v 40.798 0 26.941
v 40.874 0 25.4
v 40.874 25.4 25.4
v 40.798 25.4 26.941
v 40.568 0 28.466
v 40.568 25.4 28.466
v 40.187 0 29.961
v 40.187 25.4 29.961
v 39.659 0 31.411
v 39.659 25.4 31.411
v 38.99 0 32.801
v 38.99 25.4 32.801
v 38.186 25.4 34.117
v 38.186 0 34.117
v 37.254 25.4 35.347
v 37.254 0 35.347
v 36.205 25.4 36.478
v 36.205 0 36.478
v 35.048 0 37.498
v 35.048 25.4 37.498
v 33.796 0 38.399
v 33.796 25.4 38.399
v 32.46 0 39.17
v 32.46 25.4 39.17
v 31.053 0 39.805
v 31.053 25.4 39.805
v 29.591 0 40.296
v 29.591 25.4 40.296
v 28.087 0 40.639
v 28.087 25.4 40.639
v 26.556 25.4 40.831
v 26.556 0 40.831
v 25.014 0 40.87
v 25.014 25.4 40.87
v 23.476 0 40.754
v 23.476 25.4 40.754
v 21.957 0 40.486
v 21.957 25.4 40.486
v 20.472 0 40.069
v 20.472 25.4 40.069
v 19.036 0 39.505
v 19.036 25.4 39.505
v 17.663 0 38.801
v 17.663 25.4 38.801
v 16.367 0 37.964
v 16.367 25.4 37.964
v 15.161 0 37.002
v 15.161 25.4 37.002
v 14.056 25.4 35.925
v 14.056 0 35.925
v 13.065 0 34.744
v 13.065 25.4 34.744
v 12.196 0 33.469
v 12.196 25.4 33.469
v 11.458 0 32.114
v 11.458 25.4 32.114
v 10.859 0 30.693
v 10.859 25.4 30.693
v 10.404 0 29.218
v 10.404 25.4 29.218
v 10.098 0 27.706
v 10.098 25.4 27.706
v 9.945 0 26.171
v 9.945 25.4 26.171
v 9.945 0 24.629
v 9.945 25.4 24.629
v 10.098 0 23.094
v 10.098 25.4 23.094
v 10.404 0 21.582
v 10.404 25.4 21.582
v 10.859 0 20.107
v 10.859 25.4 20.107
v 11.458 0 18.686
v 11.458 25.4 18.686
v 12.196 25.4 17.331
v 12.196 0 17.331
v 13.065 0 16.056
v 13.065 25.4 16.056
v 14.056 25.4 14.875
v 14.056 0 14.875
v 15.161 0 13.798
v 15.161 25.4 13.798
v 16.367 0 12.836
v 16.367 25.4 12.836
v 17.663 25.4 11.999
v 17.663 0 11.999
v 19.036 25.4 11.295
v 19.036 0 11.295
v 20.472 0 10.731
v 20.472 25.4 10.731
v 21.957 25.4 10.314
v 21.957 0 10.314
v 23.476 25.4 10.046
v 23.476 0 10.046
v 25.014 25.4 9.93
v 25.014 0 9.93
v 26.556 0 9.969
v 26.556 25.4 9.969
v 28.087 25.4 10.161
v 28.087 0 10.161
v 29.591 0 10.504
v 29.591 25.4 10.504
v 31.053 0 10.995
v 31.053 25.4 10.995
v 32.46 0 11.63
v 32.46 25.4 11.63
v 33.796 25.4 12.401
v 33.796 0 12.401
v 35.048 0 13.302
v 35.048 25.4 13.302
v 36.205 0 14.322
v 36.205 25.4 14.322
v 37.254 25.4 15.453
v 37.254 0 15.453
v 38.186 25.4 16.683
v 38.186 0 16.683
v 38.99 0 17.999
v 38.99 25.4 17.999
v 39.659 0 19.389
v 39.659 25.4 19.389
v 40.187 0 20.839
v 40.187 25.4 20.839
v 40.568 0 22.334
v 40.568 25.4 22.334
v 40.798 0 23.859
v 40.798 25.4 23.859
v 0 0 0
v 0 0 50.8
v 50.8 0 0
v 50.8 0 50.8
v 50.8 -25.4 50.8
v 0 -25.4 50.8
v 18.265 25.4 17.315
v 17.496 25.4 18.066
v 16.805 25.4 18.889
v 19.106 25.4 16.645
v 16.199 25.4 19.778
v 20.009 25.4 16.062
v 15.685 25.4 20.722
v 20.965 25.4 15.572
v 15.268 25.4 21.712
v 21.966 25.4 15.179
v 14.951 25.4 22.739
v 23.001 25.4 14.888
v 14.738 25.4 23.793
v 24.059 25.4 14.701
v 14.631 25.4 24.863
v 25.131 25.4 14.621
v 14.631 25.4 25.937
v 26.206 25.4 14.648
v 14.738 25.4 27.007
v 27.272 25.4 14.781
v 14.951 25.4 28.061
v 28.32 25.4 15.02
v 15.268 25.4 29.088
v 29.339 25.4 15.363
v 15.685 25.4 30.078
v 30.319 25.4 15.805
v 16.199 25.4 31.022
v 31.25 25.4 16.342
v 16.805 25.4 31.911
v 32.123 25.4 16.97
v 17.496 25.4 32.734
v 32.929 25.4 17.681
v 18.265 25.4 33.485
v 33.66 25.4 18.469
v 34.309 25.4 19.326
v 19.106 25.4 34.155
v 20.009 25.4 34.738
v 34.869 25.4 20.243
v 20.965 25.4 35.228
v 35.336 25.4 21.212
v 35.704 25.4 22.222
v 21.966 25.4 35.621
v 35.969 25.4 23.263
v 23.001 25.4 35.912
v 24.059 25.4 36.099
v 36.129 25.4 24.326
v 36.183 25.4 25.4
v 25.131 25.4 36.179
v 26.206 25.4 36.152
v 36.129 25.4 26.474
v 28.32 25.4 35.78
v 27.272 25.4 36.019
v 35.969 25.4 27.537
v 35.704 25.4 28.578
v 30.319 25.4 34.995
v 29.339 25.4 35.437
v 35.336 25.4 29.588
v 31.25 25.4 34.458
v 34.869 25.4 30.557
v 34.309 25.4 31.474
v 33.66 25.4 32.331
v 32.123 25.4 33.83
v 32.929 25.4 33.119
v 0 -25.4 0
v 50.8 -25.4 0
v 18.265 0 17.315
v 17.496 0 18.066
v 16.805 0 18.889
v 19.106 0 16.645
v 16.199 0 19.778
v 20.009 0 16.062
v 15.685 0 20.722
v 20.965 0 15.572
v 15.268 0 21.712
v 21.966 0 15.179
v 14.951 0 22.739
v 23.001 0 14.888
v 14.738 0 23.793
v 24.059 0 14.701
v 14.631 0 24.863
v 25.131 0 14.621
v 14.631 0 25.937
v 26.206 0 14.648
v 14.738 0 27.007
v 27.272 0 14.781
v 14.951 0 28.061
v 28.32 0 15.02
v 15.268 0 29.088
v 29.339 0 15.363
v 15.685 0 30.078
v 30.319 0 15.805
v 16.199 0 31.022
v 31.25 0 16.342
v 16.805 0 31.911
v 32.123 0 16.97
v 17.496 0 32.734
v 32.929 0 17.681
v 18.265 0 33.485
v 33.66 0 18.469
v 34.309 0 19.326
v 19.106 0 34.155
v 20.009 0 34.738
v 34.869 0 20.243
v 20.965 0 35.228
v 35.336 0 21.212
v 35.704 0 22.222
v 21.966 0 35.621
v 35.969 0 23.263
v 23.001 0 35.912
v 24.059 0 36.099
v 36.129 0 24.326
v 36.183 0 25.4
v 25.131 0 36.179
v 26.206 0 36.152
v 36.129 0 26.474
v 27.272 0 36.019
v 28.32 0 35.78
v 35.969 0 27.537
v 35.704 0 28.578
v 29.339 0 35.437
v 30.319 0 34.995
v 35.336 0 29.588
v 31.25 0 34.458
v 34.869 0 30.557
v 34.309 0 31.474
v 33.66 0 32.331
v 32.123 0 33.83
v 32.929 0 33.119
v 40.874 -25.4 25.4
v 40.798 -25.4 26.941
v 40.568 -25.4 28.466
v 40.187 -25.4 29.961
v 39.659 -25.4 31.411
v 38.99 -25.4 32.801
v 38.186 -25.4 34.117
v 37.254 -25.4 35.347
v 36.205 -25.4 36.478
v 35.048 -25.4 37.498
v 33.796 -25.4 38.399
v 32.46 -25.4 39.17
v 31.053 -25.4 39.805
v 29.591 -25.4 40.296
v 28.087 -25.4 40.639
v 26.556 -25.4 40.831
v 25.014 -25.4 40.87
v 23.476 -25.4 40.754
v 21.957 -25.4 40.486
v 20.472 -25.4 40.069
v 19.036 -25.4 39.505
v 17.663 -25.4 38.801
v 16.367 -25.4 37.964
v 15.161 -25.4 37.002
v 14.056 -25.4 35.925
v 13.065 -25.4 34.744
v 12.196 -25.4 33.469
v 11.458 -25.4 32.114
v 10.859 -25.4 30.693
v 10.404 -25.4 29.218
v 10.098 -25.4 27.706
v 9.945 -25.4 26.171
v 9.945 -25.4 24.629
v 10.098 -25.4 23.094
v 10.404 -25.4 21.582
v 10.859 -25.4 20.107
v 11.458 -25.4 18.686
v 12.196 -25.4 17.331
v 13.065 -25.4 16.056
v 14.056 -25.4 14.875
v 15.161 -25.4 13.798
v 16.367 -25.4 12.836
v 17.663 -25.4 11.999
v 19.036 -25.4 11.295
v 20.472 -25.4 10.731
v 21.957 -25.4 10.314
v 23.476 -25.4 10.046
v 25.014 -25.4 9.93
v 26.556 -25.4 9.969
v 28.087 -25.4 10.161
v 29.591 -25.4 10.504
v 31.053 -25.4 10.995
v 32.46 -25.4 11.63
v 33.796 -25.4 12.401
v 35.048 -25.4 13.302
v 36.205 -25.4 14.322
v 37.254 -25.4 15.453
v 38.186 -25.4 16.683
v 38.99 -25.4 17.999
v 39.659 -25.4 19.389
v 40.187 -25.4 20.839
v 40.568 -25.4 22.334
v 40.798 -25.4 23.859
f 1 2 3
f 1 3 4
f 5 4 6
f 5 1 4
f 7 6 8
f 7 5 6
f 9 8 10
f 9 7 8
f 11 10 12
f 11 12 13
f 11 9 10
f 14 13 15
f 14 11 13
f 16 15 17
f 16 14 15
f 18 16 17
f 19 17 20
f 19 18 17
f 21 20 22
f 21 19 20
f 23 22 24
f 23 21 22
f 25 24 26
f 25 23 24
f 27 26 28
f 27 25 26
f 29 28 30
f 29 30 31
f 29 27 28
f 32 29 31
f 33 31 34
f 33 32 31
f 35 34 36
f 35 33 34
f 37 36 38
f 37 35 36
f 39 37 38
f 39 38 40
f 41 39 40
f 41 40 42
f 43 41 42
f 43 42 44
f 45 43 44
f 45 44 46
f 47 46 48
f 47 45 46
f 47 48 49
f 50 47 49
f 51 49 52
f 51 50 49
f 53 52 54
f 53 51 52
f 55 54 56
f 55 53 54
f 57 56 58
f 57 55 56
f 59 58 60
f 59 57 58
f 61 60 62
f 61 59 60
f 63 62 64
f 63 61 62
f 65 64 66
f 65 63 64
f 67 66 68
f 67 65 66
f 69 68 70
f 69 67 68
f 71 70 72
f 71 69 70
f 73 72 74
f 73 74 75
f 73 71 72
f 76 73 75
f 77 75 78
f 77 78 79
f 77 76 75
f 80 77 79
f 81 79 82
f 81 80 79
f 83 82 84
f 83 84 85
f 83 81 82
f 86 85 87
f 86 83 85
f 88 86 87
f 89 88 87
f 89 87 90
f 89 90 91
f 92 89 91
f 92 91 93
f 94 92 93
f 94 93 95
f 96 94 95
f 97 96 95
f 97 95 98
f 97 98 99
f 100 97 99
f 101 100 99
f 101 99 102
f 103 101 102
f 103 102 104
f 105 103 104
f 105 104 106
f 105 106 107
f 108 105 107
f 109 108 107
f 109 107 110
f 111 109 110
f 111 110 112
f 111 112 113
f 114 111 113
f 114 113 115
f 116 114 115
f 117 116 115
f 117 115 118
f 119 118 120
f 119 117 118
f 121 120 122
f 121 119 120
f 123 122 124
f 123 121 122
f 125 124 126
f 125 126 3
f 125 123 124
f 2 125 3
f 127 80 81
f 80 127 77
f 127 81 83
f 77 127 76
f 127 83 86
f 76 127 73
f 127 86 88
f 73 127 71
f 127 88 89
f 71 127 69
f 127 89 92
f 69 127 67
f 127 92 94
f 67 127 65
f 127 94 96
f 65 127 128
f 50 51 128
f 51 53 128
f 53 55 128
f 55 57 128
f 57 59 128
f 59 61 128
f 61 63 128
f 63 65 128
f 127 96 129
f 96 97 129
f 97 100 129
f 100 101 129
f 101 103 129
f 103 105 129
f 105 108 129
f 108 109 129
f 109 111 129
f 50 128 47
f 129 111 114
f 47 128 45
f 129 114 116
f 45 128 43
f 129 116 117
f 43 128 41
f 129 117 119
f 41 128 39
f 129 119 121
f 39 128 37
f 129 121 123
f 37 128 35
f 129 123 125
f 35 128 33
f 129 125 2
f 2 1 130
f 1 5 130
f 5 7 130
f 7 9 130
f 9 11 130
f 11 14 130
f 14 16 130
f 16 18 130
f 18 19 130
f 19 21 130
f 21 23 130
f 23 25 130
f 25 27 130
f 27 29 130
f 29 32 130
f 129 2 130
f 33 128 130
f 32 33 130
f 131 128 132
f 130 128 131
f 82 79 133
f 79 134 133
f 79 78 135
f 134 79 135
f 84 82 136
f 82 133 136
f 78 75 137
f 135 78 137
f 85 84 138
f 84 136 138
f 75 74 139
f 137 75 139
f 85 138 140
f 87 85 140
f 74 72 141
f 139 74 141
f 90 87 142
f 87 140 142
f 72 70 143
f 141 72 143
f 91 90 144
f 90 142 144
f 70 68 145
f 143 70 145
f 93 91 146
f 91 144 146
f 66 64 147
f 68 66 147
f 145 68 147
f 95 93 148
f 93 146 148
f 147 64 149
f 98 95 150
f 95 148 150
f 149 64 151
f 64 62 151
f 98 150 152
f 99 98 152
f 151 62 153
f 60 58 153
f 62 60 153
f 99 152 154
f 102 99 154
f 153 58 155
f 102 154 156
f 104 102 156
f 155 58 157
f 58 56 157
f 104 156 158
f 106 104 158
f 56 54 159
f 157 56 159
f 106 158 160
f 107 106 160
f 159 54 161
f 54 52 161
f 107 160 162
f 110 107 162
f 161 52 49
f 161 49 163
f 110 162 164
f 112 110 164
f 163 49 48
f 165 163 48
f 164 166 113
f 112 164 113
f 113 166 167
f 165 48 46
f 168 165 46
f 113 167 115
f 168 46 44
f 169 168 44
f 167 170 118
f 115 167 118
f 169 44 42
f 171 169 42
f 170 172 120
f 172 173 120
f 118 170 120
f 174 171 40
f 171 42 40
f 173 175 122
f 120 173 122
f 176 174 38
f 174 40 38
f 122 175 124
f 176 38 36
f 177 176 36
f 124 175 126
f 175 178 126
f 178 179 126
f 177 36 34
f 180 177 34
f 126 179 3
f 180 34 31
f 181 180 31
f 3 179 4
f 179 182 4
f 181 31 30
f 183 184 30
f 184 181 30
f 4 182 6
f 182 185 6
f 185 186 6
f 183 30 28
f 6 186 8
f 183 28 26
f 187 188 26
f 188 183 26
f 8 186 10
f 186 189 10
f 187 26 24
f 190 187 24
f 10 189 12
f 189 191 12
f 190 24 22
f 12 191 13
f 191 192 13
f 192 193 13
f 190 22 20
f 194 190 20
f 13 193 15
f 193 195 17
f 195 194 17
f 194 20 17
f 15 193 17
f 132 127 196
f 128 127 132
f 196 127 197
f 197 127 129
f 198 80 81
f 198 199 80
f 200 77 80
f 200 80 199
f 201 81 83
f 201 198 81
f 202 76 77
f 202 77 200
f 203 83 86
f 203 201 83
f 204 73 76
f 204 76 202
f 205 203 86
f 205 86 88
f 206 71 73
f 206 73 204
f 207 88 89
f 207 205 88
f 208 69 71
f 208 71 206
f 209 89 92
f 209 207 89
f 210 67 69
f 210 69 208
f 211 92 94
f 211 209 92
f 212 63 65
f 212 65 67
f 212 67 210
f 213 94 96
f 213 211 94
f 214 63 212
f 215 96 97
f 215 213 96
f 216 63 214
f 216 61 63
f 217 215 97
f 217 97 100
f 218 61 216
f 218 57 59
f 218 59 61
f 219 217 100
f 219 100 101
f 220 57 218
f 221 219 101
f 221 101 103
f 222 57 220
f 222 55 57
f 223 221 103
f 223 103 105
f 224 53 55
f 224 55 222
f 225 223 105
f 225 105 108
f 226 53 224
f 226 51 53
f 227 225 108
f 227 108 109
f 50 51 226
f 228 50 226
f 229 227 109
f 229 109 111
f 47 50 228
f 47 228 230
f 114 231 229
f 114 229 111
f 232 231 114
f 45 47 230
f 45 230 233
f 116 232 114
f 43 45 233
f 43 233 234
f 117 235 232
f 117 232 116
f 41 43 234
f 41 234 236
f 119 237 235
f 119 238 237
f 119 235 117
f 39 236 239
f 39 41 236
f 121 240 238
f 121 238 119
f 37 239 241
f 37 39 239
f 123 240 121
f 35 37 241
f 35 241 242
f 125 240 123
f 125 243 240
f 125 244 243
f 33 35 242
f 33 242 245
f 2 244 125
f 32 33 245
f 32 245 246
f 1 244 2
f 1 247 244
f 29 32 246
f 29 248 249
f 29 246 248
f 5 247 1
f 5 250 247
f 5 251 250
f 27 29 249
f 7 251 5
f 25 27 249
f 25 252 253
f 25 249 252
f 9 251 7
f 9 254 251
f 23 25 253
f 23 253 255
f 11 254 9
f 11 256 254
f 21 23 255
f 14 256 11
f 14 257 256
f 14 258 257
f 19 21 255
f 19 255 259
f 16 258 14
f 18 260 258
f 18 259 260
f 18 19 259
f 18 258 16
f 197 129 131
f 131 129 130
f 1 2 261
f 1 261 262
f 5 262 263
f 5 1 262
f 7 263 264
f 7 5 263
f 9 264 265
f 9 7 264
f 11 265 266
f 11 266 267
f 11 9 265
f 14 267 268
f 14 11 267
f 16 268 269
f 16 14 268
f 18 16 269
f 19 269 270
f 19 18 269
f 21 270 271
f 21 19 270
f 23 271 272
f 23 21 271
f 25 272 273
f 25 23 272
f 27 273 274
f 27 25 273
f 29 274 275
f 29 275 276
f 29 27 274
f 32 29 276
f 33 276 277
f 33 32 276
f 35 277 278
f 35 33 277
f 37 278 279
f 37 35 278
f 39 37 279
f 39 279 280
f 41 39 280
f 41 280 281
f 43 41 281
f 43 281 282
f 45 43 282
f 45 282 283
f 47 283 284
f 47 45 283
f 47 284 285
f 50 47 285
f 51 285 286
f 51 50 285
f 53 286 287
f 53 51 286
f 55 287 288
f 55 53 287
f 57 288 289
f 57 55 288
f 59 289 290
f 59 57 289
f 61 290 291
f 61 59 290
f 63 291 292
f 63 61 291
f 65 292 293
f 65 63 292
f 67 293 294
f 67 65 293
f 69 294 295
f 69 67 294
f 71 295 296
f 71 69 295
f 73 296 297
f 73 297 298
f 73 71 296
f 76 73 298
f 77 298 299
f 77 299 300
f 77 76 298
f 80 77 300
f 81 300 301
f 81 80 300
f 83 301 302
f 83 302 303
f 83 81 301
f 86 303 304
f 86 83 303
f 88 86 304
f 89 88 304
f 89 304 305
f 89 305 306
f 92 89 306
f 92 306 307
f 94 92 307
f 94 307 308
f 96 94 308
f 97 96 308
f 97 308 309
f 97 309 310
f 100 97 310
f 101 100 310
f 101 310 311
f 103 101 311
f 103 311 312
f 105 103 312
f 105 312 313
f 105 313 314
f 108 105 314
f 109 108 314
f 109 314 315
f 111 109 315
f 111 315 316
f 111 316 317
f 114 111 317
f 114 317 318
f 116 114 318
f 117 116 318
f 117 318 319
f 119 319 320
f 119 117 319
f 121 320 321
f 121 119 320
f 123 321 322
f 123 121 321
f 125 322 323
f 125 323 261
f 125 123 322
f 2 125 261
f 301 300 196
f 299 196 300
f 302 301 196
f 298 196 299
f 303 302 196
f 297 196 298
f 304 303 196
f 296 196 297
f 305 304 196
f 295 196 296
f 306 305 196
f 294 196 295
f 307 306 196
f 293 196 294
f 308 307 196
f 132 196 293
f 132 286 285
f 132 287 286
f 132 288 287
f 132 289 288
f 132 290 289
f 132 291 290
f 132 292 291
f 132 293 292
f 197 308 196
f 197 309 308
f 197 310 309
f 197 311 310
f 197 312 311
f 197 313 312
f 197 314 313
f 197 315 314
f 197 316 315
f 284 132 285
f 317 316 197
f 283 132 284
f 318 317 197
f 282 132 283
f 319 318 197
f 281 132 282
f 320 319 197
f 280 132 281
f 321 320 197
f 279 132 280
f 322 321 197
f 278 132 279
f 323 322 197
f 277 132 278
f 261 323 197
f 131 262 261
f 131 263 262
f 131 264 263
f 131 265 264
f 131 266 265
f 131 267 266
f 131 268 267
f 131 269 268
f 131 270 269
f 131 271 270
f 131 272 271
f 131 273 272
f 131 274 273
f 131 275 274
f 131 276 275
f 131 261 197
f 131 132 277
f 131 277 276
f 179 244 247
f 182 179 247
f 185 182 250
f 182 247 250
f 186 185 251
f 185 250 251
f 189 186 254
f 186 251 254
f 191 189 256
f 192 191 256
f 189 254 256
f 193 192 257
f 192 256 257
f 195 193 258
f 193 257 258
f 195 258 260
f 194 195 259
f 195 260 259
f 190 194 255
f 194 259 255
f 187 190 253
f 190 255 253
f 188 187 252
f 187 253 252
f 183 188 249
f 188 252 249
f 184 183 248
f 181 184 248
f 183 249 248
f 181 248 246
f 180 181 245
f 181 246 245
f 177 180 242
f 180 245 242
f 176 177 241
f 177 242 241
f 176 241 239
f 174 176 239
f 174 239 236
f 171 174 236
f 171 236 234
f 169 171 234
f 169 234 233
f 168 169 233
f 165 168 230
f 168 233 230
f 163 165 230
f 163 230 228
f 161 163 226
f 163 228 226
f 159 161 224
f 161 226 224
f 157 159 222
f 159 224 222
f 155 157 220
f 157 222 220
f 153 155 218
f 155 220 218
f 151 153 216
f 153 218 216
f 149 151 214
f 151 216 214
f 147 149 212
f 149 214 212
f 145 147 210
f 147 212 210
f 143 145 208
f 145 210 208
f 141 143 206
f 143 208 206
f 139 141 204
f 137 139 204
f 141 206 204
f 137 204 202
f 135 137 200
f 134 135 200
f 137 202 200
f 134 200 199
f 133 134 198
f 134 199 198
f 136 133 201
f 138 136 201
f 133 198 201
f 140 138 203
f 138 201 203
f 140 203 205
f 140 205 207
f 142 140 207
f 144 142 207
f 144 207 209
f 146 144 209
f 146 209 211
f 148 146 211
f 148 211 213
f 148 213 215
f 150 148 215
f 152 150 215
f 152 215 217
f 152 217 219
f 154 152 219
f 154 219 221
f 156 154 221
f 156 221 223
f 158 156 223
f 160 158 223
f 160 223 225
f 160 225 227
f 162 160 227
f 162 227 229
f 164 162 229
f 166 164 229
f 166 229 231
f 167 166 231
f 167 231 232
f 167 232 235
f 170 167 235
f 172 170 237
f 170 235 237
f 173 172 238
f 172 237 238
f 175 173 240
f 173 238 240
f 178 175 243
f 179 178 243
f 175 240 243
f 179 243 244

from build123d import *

# Parameters (mm, degrees)
F0_W     = 50.8
F0_H     = 50.8
F0_R     = 15.474425
F1_DEPTH = 25.4
F0_R_2   = 10.782577
F2_DEPTH = 25.4


with BuildPart() as f1:
    # F0 (on Front) → F1 (new body)
    with BuildSketch(Plane.XZ):
        with Locations((25.4, 25.4)):
            Rectangle(F0_W, F0_H)
        with Locations((25.4, 25.4)):
            Circle(F0_R, mode=Mode.SUBTRACT)
    extrude(amount=F1_DEPTH)

    # F0 (on Front) → F2 (join)
    with BuildSketch(Plane.XZ):
        with Locations((25.4, 25.4)):
            Circle(F0_R)
        with Locations((25.4, 25.4)):
            Circle(F0_R_2, mode=Mode.SUBTRACT)
    extrude(amount=-F2_DEPTH)


solid = f1.part
